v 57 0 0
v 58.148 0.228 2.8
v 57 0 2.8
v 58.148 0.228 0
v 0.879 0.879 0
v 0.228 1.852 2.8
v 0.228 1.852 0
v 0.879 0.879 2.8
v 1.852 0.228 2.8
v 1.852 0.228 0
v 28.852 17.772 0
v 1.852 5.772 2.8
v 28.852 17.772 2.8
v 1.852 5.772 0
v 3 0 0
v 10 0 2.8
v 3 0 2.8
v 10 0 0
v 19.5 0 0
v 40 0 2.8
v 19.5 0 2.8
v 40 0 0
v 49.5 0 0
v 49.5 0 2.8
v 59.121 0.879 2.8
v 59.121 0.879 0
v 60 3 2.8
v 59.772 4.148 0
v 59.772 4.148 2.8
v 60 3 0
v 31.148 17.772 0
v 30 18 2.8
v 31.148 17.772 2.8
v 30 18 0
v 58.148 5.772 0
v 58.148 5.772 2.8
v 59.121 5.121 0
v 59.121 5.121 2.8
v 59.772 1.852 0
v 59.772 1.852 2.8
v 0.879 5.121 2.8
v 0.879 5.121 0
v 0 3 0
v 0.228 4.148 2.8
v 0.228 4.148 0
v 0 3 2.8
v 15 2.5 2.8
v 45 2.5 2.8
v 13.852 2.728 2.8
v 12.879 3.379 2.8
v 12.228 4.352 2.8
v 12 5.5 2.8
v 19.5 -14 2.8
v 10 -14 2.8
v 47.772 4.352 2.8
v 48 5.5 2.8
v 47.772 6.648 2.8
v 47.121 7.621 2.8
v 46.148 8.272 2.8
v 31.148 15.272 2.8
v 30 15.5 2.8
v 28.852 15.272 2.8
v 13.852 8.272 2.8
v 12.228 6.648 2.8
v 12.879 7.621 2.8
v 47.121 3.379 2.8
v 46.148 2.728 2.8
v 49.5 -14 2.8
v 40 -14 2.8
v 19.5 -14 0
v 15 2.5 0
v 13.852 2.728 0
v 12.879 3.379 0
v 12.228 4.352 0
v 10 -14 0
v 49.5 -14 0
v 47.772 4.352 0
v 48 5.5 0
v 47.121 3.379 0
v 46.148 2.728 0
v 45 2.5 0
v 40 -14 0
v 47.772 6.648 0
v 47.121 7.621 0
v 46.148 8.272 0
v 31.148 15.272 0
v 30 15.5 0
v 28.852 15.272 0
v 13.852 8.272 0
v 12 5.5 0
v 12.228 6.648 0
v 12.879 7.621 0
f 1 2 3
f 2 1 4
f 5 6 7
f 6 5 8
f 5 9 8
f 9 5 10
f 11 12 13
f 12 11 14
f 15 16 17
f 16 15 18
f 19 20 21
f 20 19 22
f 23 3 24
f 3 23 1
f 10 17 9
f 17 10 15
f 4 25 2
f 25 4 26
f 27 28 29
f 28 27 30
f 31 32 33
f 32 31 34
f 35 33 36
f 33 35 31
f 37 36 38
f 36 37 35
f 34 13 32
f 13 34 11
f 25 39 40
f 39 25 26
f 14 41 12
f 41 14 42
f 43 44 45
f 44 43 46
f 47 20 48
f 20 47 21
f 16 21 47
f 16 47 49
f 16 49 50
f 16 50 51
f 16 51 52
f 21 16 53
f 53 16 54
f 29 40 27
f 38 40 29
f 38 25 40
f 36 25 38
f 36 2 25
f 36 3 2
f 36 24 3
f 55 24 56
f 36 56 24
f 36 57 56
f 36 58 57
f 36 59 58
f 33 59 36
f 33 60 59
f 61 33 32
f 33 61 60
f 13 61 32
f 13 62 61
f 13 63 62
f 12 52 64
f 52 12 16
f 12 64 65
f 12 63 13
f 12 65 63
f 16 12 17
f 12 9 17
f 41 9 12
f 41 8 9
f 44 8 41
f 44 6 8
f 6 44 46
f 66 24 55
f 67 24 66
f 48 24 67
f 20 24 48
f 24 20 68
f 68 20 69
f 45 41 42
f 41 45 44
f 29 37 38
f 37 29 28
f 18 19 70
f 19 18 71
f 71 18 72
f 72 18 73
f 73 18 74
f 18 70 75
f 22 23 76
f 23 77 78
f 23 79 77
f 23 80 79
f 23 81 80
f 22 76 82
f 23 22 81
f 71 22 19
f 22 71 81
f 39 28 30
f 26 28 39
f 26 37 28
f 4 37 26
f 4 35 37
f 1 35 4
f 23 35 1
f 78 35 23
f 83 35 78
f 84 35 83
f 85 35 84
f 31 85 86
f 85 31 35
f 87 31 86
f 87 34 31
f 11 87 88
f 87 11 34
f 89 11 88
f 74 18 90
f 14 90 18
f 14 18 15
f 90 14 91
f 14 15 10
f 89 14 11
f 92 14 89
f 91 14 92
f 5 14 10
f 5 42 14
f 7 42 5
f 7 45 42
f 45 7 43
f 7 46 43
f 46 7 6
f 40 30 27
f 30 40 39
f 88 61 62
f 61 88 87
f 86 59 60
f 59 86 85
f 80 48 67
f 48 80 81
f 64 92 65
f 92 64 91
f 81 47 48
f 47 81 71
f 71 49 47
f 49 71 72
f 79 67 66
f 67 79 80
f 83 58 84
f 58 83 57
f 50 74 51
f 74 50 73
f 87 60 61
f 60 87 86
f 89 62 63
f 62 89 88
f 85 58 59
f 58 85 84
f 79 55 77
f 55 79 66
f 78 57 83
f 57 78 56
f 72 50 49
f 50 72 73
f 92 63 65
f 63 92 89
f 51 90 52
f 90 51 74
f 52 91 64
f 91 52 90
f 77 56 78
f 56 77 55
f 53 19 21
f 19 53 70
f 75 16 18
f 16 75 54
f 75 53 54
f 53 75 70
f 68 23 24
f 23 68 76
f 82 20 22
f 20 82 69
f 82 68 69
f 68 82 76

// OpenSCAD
/* bt-nøkkel.scad
 *
 * Nøkkel til tøkepapirdispenser fra Biltema
 *
 * Roy Sigurd Karlsbakk <roy@karlsbakk.net>
 * Lisensiert under https://creativecommons.org/licenses/by-nc-sa/4.0/deed.no
 */
 
$fn=$preview ? 8 : 16;

indre_triangel_r = 3;
indre_triangel_lengde = 30;
indre_triangel_hoyde = 7;

midtre_triangel_bredde = 12;
midtre_triangel_hoyde = 5;

/*
 * Versjon a: Tykkelse 3,0
 * Versjon b: Tykkelse 2,8
 * Versjon c: Tykkelse 2,8 */
tykkelse = 2.8;

pinnebredde=9.5;
pinnelengde=14;
pinneglippe=20.5;

module indre_triangel() {
    translate([indre_triangel_r,indre_triangel_r,0]) {
        hull() {
            cylinder(r=indre_triangel_r,h=tykkelse);
            translate([indre_triangel_lengde,0,0])
                cylinder(r=indre_triangel_r,h=tykkelse);
            translate([indre_triangel_lengde/2, indre_triangel_hoyde,0]) 
                cylinder(r=indre_triangel_r,h=tykkelse);
        }
    }
}

module midtre_triangel() {
    translate([indre_triangel_r,indre_triangel_r,0]) {
        hull() {
            cylinder(r=indre_triangel_r,h=tykkelse);
            translate([indre_triangel_lengde+midtre_triangel_bredde*2,0,0])
                cylinder(r=indre_triangel_r,h=tykkelse);
            translate([indre_triangel_lengde/2+midtre_triangel_bredde, indre_triangel_hoyde+midtre_triangel_hoyde,0]) 
                cylinder(r=indre_triangel_r,h=tykkelse);
// translate([indre_triangel_lengde/2+midtre_triangel_bredde*2, indre_triangel_hoyde+midtre_triangel_hoyde*2,0]) 
        }
    }
}

module pinne() {
    r1=1.5;
    r2=r1*2;
    
    hull() {
        translate([r1,r1,0]) sphere(r1);
        translate([pinnebredde+r1,r1,0]) sphere(r1);
        translate([pinnebredde,pinnelengde-r2,0]) sphere(r2);
        translate([r2,pinnelengde-r2,0]) sphere(r2);
    }
}

module pinner() {
    pinne();
    translate([pinneglippe+pinnebredde,0,0])
        pinne();
}

module nokkelpinner() {
    // font="Urban Sketch:style=Regular"
    font="X.Template:style=Regular";
    
    cube([pinnebredde,pinnelengde,tykkelse]);
    translate([pinneglippe+pinnebredde,0,0]) {
        difference() {
            cube([pinnebredde,pinnelengde,tykkelse]);
//            translate([2,2,0]) linear_extrude(tykkelse) text("b", font=font, size=8);
        }
    }
}

module nokkel() {
    difference() {
        midtre_triangel();
        translate([midtre_triangel_bredde, midtre_triangel_hoyde/2,0]) {
            indre_triangel();
        }
    }
//    translate([indre_triangel_lengde+pinnebredde,-pinnelengde,,0]) { nokkelpinne(); }
//    translate([indre_triangel_lengde-pinnebredde,-pinnelengde,,0]) {
    translate([10,-pinnelengde,0]) {
        nokkelpinner();
    }
}

//pinner();
nokkel();
